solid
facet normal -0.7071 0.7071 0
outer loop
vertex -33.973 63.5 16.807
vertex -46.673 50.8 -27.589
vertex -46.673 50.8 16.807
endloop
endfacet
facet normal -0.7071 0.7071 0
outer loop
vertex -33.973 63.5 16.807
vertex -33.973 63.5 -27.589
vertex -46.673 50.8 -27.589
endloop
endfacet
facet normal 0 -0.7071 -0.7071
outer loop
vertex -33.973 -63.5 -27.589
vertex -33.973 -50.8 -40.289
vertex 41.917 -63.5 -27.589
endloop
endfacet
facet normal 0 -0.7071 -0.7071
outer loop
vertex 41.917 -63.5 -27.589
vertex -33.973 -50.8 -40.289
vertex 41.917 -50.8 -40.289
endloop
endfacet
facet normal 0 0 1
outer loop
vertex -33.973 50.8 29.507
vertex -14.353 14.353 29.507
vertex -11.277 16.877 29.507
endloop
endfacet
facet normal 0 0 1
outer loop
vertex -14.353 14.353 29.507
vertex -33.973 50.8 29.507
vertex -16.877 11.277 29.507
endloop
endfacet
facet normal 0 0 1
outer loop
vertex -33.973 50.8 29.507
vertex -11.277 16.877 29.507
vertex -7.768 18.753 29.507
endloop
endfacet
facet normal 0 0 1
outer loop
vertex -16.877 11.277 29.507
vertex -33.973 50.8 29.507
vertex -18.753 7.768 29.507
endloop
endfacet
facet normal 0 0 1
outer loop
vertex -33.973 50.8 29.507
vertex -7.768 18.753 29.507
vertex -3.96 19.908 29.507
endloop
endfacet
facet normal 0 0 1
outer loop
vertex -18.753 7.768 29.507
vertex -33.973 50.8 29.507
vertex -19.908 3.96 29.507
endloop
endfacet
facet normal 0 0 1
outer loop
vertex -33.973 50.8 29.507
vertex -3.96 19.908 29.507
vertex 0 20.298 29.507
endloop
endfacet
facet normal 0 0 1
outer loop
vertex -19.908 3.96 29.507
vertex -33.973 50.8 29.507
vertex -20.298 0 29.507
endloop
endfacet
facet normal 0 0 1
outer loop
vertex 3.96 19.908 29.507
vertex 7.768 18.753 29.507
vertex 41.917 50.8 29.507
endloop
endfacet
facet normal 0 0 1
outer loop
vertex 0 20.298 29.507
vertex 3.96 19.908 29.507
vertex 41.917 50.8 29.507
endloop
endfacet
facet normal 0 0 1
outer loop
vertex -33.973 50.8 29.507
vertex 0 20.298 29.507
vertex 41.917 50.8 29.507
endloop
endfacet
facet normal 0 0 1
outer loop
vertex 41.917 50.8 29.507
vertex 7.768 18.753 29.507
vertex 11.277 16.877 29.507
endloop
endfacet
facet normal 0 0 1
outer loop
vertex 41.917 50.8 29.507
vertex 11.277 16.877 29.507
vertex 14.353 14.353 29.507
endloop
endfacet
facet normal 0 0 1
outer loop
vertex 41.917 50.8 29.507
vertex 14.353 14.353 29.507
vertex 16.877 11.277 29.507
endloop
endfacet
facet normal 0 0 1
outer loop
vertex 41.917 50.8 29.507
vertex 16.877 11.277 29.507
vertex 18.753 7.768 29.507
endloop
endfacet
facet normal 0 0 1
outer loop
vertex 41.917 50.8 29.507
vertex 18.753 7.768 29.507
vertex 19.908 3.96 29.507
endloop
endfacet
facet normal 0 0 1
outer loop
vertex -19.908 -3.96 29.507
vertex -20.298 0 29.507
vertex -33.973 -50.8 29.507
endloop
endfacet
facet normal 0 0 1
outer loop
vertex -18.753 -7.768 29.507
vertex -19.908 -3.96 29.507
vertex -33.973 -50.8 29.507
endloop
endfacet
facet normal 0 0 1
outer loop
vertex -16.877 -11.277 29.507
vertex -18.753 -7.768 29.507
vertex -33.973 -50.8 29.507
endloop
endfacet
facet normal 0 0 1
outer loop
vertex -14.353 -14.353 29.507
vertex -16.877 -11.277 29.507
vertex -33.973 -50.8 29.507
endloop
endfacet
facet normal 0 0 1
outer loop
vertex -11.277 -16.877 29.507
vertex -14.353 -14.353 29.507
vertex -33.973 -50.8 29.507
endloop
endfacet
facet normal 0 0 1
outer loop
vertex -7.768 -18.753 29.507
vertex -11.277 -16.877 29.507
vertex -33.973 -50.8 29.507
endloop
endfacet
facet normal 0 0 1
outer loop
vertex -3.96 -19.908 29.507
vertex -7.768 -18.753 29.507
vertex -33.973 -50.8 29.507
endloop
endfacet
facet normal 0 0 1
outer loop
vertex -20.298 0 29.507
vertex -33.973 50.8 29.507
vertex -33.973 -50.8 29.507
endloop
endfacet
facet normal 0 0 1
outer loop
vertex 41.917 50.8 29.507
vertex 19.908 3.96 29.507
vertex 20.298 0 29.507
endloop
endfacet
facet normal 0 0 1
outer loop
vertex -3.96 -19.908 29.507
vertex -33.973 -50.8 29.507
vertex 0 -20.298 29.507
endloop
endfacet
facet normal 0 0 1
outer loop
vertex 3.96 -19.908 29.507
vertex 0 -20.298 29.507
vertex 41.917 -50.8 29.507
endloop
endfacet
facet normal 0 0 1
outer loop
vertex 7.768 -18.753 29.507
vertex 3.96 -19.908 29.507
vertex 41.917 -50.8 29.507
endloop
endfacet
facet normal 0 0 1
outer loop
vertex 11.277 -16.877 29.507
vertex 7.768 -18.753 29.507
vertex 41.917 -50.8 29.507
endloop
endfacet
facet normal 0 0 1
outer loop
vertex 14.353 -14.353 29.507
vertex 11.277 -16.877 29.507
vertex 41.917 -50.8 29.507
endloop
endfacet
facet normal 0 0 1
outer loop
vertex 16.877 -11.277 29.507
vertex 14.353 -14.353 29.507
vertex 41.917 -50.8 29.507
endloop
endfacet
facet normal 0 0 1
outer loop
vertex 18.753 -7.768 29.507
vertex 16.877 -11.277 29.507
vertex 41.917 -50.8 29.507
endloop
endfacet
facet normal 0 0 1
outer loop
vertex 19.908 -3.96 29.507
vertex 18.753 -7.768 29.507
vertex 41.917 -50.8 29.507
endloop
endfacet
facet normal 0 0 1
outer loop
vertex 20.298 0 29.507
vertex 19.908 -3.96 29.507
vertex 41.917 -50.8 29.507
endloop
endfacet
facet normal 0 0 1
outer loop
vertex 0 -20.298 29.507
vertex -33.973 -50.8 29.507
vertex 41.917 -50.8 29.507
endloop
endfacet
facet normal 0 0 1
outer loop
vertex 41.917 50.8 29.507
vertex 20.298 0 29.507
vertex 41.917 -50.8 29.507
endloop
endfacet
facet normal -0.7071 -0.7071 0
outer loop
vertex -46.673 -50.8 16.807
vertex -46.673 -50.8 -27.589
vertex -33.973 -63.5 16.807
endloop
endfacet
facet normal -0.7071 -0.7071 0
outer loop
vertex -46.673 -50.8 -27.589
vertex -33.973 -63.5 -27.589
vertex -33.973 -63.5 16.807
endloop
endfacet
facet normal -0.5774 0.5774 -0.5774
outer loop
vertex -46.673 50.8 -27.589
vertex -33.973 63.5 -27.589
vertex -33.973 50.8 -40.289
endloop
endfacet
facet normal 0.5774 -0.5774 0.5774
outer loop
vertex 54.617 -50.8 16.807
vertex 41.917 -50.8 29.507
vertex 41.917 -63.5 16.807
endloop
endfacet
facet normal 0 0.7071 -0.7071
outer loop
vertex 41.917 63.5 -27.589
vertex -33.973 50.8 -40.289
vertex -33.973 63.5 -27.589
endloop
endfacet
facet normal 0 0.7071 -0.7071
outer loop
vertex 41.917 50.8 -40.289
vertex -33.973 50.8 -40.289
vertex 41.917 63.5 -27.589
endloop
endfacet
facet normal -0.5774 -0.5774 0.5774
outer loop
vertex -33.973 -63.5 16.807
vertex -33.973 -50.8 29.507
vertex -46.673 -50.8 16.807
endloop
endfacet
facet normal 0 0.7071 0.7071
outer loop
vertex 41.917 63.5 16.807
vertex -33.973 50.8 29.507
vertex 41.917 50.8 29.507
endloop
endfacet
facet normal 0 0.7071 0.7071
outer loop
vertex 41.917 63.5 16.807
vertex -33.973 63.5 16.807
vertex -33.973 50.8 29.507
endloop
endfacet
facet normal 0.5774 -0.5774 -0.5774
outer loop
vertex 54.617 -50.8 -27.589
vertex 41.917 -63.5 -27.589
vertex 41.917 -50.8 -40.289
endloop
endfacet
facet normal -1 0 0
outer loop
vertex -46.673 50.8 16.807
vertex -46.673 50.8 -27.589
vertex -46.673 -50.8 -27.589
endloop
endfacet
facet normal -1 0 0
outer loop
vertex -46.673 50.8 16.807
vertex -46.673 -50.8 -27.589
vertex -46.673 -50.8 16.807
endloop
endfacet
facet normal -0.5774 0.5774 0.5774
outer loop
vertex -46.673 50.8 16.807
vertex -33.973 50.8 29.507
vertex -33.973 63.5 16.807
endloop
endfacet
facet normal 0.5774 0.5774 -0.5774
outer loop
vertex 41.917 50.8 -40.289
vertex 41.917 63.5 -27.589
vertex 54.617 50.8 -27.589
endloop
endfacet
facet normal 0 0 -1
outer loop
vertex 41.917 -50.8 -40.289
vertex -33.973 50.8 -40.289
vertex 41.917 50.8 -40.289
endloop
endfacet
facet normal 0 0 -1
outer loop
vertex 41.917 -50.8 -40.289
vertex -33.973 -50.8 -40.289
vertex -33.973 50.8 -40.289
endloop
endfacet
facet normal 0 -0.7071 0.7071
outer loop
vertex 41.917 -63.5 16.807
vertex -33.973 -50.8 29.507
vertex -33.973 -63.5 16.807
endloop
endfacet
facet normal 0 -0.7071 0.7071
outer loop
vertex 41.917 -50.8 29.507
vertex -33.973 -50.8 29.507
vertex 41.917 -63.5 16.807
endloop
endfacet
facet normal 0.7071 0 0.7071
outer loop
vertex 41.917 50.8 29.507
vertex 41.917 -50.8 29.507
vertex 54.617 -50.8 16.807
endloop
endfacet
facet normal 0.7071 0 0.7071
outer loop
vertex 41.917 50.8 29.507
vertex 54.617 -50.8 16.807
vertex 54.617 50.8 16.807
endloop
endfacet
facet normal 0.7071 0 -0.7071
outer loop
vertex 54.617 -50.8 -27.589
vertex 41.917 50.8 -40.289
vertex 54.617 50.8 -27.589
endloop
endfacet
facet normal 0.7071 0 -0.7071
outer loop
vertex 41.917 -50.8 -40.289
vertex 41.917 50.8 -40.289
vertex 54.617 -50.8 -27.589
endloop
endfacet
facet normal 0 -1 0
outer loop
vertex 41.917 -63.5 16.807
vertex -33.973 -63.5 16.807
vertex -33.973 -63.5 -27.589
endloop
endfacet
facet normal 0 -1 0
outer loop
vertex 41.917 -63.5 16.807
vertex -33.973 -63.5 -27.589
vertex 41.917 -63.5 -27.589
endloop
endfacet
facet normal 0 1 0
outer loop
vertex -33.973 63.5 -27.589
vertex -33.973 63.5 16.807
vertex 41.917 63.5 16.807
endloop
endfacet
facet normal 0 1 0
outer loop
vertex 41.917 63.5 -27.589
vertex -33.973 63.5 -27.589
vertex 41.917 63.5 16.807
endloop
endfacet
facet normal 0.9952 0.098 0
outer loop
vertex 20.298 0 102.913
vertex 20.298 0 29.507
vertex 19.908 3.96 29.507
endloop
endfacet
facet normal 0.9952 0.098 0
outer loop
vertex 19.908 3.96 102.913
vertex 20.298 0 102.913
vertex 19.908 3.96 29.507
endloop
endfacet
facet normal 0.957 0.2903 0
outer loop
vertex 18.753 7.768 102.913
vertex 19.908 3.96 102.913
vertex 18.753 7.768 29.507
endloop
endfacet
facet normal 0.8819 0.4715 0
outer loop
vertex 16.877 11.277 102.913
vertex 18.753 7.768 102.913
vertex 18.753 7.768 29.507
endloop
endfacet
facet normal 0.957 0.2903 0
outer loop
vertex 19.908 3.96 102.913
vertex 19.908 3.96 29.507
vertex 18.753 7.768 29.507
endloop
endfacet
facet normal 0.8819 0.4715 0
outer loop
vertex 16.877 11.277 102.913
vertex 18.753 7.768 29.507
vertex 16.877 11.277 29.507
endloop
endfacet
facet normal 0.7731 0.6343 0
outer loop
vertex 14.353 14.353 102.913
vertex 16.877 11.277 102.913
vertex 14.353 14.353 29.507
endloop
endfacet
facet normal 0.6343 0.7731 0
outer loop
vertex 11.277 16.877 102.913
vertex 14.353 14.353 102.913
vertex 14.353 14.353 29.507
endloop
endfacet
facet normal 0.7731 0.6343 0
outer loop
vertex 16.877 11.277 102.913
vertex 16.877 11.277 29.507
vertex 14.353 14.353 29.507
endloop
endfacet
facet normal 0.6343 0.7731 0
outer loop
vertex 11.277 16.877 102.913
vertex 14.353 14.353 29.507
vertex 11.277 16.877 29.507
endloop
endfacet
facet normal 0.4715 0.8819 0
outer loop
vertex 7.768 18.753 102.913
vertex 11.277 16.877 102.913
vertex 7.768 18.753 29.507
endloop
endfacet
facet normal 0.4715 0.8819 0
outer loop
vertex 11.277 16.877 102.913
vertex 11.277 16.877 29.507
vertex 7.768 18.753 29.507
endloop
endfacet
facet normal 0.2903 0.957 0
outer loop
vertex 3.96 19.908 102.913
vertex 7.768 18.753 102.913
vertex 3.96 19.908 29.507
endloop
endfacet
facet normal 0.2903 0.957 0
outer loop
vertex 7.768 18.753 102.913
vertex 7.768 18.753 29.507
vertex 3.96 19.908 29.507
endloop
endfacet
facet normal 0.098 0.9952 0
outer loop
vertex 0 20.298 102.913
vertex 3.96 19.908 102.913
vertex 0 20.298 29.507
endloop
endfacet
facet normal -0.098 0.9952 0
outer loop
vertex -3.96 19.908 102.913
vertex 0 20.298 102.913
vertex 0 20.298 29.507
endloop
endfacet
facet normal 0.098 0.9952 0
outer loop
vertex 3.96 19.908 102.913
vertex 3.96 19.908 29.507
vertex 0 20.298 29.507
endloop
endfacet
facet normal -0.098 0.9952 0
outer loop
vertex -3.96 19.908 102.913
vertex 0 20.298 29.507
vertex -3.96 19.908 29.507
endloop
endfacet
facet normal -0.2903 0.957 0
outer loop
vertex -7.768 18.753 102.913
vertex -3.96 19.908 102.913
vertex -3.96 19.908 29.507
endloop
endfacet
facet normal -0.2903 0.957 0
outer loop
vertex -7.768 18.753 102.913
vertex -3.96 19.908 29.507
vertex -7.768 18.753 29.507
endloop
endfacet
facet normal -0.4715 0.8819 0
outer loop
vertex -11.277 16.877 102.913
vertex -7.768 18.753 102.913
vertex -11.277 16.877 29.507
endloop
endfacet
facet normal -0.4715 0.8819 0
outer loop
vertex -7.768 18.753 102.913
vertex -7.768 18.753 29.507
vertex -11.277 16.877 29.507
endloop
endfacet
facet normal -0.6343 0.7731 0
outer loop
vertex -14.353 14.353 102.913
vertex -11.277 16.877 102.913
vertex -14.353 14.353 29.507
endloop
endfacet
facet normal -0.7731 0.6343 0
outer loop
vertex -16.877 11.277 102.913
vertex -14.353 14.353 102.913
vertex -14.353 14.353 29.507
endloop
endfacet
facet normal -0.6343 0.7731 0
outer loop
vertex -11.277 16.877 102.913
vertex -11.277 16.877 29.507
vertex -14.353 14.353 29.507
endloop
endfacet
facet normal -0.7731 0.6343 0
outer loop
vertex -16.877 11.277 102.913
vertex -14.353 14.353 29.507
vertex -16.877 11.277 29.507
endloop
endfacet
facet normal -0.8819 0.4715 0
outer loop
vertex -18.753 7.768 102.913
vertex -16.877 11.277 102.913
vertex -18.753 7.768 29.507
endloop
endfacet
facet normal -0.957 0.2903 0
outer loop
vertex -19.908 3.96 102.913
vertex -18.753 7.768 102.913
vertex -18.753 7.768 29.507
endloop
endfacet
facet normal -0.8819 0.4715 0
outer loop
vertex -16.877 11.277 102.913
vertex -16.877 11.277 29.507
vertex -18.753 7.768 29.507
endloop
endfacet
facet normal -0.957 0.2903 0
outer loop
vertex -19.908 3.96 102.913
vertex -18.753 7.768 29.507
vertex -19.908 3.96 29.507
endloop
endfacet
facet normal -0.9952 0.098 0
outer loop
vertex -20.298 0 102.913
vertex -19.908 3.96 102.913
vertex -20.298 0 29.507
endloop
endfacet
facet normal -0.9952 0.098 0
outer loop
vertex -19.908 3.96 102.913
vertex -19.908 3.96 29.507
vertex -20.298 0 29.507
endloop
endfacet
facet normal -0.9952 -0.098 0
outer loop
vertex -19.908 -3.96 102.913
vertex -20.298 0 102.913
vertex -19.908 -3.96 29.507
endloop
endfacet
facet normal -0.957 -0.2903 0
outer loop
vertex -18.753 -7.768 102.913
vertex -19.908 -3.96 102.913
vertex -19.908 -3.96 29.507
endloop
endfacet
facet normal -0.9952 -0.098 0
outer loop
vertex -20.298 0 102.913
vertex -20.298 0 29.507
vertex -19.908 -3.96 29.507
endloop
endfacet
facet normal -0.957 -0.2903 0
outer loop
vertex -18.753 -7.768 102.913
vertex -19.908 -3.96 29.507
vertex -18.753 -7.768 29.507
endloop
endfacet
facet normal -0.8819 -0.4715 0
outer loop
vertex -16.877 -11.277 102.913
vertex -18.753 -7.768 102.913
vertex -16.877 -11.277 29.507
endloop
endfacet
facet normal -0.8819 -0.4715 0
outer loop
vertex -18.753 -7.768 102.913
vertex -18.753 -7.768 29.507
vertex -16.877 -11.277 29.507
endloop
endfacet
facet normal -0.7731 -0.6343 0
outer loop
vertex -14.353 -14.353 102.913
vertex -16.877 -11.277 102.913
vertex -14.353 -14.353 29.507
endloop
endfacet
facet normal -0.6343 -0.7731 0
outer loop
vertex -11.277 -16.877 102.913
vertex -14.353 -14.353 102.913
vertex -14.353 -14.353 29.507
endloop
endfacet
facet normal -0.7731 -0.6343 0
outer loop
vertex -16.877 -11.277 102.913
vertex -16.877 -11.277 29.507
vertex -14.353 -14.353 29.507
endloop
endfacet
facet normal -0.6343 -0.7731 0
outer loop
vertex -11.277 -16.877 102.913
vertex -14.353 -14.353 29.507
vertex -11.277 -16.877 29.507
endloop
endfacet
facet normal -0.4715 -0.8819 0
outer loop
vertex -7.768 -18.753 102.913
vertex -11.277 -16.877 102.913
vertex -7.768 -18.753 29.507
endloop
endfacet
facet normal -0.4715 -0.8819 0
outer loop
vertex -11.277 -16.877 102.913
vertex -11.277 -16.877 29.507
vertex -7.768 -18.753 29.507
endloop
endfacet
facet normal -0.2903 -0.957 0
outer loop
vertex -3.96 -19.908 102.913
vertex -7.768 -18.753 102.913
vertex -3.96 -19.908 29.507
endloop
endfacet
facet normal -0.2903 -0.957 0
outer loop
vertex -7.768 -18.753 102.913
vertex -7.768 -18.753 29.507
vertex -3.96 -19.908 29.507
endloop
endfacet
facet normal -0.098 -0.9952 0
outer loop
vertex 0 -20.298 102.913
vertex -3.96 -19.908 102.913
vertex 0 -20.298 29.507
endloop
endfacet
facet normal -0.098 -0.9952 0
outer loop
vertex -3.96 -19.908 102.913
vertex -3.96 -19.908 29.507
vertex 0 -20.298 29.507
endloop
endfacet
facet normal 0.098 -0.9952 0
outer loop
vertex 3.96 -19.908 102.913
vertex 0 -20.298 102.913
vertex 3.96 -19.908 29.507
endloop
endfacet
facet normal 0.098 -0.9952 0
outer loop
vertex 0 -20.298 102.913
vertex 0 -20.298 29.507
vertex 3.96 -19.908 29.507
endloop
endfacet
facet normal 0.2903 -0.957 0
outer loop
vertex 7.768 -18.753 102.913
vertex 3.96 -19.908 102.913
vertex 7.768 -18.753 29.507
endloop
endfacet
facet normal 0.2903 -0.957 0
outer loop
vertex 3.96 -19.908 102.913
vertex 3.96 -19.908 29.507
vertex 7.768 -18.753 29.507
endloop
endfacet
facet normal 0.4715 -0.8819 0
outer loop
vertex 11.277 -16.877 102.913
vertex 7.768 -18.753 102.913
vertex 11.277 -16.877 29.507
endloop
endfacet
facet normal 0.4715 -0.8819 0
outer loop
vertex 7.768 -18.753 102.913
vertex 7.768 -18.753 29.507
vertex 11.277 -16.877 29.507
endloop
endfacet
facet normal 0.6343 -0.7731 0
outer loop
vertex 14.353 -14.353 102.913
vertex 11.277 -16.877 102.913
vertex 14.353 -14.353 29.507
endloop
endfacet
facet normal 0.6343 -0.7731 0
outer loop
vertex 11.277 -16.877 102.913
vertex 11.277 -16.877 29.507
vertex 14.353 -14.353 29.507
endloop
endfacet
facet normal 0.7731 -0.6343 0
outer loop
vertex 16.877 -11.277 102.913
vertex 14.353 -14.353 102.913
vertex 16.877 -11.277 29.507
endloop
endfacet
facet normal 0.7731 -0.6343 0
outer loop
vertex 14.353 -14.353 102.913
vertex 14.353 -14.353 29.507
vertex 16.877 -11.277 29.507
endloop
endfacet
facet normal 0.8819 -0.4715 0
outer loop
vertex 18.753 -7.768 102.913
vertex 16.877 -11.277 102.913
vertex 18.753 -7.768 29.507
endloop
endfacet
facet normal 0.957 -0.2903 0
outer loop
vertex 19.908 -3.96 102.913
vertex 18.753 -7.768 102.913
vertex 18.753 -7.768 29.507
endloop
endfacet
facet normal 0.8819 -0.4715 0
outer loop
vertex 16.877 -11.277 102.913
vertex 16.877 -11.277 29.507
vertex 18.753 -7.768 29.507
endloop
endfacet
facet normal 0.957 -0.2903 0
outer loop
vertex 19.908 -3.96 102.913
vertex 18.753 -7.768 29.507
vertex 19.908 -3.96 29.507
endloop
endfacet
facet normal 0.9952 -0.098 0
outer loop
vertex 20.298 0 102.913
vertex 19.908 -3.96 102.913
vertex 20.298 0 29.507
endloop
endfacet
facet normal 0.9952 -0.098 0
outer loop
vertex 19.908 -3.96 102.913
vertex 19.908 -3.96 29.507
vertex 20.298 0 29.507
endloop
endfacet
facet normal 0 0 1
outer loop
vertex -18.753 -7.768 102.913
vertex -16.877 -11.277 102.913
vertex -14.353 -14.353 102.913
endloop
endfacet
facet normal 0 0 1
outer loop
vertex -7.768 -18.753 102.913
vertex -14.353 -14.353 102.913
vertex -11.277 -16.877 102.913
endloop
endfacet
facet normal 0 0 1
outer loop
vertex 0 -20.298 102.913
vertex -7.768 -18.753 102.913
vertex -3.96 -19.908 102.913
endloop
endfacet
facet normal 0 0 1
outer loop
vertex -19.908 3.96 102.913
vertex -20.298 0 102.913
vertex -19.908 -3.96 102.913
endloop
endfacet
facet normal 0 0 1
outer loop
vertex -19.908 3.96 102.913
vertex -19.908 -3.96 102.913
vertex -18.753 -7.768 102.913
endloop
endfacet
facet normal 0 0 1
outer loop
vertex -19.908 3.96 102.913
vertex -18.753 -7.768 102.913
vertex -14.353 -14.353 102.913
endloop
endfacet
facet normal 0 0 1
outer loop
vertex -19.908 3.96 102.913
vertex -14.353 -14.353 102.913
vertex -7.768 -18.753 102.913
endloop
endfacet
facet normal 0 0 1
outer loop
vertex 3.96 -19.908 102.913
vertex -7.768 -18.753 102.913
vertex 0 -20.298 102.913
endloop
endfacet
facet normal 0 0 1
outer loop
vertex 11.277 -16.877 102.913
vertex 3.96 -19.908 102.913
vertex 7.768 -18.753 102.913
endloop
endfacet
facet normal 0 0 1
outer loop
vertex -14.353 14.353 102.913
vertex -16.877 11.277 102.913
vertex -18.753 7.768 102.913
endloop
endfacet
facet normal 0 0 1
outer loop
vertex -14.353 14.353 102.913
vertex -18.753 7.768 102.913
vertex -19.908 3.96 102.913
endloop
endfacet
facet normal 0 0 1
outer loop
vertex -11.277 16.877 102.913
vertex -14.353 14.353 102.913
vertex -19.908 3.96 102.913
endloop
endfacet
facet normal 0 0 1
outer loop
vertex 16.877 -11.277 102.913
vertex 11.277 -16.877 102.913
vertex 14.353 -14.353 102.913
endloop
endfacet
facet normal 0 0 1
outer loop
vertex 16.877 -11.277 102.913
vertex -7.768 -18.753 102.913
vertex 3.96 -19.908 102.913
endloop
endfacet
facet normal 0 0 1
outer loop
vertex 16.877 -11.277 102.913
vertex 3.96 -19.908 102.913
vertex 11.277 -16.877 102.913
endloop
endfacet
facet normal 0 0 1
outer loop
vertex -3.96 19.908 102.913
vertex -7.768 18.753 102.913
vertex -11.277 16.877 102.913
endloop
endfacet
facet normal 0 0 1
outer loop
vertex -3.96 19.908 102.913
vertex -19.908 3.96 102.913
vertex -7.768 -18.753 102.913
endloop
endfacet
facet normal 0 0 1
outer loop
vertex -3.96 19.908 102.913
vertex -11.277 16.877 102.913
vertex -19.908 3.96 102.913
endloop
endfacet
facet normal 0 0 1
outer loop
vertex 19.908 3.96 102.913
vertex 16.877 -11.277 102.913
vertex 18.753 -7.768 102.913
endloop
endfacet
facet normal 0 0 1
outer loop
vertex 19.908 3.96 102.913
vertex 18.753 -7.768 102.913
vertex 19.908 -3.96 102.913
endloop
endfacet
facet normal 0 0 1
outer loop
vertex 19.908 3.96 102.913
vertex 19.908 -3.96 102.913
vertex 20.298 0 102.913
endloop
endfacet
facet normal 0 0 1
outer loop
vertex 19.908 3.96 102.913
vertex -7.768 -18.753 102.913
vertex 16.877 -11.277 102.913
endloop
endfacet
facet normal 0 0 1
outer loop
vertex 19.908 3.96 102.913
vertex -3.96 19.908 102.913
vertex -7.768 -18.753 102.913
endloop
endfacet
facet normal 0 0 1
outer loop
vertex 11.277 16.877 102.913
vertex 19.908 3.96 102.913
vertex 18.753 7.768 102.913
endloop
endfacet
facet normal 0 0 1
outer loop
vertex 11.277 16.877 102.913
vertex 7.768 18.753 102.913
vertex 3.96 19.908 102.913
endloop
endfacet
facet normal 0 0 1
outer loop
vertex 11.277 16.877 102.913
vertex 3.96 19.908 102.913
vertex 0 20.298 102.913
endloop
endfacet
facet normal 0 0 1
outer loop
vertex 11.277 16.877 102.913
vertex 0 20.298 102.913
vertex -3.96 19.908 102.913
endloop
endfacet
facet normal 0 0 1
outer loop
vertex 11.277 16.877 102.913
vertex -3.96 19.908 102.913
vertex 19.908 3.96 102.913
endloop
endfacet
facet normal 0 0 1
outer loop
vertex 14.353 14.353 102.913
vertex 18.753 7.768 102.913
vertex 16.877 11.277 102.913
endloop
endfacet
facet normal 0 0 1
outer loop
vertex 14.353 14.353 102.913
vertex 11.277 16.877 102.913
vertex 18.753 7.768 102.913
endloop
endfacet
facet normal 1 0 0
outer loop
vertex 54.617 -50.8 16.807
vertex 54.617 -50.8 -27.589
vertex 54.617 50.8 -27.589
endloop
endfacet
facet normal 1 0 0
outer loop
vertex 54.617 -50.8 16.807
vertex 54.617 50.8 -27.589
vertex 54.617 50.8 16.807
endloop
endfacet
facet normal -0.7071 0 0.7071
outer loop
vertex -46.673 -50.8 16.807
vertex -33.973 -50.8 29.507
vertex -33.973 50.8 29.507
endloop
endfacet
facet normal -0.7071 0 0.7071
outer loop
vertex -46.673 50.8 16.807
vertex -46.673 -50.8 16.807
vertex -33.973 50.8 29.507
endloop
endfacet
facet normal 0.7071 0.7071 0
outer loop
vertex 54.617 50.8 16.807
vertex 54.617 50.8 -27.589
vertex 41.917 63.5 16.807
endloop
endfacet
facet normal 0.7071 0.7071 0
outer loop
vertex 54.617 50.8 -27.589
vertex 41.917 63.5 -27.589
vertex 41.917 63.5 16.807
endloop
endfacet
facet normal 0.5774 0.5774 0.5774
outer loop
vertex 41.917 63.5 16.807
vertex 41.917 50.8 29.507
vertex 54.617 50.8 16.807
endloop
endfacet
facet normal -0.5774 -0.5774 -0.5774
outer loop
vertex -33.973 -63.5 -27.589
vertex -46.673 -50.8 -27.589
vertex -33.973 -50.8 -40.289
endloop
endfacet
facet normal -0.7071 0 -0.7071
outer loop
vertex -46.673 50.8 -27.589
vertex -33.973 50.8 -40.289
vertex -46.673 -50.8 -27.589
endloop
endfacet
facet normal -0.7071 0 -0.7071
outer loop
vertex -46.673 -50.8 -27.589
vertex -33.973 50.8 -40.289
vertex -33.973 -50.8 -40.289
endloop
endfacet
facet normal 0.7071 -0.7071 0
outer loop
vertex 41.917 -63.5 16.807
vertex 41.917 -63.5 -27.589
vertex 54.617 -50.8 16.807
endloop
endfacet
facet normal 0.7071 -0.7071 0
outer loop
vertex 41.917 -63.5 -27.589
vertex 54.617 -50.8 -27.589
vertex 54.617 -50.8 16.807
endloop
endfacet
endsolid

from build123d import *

# Parameters (mm, degrees)
F0_W     = 101.289254
F0_H     = 69.795959
F1_DEPTH = 63.5
F2_SIZE  = 12.7
F3_R     = 20.297571
F4_DEPTH = 73.406


with BuildPart() as f1:
    # F0 (on Front) → F1 (new body, symmetric)
    with BuildSketch(Plane.XZ):
        with Locations((3.972126, -5.390744)):
            Rectangle(F0_W, F0_H)
    extrude(amount=F1_DEPTH, both=True)

    # F2
    f2_edges = [f1.edges().sort_by_distance(p)[0] for p in [
        (3.972126, -63.5, 29.507235),
        (54.616753, 0, 29.507235),
        (3.972126, 63.5, 29.507235),
        (-46.672501, 0, 29.507235),
        (54.616753, -63.5, -5.390745),
        (54.616753, 63.5, -5.390745),
        (-46.672501, -63.5, -5.390745),
        (-46.672501, 63.5, -5.390745),
        (3.972126, 63.5, -40.288724),
        (-46.672501, 0, -40.288724),
        (3.972126, -63.5, -40.288724),
        (54.616753, 0, -40.288724),
    ]]
    chamfer(f2_edges, length=F2_SIZE)

    # F3 (on face) → F4 (join)
    with BuildSketch(Plane.XY.offset(29.507235)):
        Circle(F3_R)
    extrude(amount=F4_DEPTH)


solid = f1.part
